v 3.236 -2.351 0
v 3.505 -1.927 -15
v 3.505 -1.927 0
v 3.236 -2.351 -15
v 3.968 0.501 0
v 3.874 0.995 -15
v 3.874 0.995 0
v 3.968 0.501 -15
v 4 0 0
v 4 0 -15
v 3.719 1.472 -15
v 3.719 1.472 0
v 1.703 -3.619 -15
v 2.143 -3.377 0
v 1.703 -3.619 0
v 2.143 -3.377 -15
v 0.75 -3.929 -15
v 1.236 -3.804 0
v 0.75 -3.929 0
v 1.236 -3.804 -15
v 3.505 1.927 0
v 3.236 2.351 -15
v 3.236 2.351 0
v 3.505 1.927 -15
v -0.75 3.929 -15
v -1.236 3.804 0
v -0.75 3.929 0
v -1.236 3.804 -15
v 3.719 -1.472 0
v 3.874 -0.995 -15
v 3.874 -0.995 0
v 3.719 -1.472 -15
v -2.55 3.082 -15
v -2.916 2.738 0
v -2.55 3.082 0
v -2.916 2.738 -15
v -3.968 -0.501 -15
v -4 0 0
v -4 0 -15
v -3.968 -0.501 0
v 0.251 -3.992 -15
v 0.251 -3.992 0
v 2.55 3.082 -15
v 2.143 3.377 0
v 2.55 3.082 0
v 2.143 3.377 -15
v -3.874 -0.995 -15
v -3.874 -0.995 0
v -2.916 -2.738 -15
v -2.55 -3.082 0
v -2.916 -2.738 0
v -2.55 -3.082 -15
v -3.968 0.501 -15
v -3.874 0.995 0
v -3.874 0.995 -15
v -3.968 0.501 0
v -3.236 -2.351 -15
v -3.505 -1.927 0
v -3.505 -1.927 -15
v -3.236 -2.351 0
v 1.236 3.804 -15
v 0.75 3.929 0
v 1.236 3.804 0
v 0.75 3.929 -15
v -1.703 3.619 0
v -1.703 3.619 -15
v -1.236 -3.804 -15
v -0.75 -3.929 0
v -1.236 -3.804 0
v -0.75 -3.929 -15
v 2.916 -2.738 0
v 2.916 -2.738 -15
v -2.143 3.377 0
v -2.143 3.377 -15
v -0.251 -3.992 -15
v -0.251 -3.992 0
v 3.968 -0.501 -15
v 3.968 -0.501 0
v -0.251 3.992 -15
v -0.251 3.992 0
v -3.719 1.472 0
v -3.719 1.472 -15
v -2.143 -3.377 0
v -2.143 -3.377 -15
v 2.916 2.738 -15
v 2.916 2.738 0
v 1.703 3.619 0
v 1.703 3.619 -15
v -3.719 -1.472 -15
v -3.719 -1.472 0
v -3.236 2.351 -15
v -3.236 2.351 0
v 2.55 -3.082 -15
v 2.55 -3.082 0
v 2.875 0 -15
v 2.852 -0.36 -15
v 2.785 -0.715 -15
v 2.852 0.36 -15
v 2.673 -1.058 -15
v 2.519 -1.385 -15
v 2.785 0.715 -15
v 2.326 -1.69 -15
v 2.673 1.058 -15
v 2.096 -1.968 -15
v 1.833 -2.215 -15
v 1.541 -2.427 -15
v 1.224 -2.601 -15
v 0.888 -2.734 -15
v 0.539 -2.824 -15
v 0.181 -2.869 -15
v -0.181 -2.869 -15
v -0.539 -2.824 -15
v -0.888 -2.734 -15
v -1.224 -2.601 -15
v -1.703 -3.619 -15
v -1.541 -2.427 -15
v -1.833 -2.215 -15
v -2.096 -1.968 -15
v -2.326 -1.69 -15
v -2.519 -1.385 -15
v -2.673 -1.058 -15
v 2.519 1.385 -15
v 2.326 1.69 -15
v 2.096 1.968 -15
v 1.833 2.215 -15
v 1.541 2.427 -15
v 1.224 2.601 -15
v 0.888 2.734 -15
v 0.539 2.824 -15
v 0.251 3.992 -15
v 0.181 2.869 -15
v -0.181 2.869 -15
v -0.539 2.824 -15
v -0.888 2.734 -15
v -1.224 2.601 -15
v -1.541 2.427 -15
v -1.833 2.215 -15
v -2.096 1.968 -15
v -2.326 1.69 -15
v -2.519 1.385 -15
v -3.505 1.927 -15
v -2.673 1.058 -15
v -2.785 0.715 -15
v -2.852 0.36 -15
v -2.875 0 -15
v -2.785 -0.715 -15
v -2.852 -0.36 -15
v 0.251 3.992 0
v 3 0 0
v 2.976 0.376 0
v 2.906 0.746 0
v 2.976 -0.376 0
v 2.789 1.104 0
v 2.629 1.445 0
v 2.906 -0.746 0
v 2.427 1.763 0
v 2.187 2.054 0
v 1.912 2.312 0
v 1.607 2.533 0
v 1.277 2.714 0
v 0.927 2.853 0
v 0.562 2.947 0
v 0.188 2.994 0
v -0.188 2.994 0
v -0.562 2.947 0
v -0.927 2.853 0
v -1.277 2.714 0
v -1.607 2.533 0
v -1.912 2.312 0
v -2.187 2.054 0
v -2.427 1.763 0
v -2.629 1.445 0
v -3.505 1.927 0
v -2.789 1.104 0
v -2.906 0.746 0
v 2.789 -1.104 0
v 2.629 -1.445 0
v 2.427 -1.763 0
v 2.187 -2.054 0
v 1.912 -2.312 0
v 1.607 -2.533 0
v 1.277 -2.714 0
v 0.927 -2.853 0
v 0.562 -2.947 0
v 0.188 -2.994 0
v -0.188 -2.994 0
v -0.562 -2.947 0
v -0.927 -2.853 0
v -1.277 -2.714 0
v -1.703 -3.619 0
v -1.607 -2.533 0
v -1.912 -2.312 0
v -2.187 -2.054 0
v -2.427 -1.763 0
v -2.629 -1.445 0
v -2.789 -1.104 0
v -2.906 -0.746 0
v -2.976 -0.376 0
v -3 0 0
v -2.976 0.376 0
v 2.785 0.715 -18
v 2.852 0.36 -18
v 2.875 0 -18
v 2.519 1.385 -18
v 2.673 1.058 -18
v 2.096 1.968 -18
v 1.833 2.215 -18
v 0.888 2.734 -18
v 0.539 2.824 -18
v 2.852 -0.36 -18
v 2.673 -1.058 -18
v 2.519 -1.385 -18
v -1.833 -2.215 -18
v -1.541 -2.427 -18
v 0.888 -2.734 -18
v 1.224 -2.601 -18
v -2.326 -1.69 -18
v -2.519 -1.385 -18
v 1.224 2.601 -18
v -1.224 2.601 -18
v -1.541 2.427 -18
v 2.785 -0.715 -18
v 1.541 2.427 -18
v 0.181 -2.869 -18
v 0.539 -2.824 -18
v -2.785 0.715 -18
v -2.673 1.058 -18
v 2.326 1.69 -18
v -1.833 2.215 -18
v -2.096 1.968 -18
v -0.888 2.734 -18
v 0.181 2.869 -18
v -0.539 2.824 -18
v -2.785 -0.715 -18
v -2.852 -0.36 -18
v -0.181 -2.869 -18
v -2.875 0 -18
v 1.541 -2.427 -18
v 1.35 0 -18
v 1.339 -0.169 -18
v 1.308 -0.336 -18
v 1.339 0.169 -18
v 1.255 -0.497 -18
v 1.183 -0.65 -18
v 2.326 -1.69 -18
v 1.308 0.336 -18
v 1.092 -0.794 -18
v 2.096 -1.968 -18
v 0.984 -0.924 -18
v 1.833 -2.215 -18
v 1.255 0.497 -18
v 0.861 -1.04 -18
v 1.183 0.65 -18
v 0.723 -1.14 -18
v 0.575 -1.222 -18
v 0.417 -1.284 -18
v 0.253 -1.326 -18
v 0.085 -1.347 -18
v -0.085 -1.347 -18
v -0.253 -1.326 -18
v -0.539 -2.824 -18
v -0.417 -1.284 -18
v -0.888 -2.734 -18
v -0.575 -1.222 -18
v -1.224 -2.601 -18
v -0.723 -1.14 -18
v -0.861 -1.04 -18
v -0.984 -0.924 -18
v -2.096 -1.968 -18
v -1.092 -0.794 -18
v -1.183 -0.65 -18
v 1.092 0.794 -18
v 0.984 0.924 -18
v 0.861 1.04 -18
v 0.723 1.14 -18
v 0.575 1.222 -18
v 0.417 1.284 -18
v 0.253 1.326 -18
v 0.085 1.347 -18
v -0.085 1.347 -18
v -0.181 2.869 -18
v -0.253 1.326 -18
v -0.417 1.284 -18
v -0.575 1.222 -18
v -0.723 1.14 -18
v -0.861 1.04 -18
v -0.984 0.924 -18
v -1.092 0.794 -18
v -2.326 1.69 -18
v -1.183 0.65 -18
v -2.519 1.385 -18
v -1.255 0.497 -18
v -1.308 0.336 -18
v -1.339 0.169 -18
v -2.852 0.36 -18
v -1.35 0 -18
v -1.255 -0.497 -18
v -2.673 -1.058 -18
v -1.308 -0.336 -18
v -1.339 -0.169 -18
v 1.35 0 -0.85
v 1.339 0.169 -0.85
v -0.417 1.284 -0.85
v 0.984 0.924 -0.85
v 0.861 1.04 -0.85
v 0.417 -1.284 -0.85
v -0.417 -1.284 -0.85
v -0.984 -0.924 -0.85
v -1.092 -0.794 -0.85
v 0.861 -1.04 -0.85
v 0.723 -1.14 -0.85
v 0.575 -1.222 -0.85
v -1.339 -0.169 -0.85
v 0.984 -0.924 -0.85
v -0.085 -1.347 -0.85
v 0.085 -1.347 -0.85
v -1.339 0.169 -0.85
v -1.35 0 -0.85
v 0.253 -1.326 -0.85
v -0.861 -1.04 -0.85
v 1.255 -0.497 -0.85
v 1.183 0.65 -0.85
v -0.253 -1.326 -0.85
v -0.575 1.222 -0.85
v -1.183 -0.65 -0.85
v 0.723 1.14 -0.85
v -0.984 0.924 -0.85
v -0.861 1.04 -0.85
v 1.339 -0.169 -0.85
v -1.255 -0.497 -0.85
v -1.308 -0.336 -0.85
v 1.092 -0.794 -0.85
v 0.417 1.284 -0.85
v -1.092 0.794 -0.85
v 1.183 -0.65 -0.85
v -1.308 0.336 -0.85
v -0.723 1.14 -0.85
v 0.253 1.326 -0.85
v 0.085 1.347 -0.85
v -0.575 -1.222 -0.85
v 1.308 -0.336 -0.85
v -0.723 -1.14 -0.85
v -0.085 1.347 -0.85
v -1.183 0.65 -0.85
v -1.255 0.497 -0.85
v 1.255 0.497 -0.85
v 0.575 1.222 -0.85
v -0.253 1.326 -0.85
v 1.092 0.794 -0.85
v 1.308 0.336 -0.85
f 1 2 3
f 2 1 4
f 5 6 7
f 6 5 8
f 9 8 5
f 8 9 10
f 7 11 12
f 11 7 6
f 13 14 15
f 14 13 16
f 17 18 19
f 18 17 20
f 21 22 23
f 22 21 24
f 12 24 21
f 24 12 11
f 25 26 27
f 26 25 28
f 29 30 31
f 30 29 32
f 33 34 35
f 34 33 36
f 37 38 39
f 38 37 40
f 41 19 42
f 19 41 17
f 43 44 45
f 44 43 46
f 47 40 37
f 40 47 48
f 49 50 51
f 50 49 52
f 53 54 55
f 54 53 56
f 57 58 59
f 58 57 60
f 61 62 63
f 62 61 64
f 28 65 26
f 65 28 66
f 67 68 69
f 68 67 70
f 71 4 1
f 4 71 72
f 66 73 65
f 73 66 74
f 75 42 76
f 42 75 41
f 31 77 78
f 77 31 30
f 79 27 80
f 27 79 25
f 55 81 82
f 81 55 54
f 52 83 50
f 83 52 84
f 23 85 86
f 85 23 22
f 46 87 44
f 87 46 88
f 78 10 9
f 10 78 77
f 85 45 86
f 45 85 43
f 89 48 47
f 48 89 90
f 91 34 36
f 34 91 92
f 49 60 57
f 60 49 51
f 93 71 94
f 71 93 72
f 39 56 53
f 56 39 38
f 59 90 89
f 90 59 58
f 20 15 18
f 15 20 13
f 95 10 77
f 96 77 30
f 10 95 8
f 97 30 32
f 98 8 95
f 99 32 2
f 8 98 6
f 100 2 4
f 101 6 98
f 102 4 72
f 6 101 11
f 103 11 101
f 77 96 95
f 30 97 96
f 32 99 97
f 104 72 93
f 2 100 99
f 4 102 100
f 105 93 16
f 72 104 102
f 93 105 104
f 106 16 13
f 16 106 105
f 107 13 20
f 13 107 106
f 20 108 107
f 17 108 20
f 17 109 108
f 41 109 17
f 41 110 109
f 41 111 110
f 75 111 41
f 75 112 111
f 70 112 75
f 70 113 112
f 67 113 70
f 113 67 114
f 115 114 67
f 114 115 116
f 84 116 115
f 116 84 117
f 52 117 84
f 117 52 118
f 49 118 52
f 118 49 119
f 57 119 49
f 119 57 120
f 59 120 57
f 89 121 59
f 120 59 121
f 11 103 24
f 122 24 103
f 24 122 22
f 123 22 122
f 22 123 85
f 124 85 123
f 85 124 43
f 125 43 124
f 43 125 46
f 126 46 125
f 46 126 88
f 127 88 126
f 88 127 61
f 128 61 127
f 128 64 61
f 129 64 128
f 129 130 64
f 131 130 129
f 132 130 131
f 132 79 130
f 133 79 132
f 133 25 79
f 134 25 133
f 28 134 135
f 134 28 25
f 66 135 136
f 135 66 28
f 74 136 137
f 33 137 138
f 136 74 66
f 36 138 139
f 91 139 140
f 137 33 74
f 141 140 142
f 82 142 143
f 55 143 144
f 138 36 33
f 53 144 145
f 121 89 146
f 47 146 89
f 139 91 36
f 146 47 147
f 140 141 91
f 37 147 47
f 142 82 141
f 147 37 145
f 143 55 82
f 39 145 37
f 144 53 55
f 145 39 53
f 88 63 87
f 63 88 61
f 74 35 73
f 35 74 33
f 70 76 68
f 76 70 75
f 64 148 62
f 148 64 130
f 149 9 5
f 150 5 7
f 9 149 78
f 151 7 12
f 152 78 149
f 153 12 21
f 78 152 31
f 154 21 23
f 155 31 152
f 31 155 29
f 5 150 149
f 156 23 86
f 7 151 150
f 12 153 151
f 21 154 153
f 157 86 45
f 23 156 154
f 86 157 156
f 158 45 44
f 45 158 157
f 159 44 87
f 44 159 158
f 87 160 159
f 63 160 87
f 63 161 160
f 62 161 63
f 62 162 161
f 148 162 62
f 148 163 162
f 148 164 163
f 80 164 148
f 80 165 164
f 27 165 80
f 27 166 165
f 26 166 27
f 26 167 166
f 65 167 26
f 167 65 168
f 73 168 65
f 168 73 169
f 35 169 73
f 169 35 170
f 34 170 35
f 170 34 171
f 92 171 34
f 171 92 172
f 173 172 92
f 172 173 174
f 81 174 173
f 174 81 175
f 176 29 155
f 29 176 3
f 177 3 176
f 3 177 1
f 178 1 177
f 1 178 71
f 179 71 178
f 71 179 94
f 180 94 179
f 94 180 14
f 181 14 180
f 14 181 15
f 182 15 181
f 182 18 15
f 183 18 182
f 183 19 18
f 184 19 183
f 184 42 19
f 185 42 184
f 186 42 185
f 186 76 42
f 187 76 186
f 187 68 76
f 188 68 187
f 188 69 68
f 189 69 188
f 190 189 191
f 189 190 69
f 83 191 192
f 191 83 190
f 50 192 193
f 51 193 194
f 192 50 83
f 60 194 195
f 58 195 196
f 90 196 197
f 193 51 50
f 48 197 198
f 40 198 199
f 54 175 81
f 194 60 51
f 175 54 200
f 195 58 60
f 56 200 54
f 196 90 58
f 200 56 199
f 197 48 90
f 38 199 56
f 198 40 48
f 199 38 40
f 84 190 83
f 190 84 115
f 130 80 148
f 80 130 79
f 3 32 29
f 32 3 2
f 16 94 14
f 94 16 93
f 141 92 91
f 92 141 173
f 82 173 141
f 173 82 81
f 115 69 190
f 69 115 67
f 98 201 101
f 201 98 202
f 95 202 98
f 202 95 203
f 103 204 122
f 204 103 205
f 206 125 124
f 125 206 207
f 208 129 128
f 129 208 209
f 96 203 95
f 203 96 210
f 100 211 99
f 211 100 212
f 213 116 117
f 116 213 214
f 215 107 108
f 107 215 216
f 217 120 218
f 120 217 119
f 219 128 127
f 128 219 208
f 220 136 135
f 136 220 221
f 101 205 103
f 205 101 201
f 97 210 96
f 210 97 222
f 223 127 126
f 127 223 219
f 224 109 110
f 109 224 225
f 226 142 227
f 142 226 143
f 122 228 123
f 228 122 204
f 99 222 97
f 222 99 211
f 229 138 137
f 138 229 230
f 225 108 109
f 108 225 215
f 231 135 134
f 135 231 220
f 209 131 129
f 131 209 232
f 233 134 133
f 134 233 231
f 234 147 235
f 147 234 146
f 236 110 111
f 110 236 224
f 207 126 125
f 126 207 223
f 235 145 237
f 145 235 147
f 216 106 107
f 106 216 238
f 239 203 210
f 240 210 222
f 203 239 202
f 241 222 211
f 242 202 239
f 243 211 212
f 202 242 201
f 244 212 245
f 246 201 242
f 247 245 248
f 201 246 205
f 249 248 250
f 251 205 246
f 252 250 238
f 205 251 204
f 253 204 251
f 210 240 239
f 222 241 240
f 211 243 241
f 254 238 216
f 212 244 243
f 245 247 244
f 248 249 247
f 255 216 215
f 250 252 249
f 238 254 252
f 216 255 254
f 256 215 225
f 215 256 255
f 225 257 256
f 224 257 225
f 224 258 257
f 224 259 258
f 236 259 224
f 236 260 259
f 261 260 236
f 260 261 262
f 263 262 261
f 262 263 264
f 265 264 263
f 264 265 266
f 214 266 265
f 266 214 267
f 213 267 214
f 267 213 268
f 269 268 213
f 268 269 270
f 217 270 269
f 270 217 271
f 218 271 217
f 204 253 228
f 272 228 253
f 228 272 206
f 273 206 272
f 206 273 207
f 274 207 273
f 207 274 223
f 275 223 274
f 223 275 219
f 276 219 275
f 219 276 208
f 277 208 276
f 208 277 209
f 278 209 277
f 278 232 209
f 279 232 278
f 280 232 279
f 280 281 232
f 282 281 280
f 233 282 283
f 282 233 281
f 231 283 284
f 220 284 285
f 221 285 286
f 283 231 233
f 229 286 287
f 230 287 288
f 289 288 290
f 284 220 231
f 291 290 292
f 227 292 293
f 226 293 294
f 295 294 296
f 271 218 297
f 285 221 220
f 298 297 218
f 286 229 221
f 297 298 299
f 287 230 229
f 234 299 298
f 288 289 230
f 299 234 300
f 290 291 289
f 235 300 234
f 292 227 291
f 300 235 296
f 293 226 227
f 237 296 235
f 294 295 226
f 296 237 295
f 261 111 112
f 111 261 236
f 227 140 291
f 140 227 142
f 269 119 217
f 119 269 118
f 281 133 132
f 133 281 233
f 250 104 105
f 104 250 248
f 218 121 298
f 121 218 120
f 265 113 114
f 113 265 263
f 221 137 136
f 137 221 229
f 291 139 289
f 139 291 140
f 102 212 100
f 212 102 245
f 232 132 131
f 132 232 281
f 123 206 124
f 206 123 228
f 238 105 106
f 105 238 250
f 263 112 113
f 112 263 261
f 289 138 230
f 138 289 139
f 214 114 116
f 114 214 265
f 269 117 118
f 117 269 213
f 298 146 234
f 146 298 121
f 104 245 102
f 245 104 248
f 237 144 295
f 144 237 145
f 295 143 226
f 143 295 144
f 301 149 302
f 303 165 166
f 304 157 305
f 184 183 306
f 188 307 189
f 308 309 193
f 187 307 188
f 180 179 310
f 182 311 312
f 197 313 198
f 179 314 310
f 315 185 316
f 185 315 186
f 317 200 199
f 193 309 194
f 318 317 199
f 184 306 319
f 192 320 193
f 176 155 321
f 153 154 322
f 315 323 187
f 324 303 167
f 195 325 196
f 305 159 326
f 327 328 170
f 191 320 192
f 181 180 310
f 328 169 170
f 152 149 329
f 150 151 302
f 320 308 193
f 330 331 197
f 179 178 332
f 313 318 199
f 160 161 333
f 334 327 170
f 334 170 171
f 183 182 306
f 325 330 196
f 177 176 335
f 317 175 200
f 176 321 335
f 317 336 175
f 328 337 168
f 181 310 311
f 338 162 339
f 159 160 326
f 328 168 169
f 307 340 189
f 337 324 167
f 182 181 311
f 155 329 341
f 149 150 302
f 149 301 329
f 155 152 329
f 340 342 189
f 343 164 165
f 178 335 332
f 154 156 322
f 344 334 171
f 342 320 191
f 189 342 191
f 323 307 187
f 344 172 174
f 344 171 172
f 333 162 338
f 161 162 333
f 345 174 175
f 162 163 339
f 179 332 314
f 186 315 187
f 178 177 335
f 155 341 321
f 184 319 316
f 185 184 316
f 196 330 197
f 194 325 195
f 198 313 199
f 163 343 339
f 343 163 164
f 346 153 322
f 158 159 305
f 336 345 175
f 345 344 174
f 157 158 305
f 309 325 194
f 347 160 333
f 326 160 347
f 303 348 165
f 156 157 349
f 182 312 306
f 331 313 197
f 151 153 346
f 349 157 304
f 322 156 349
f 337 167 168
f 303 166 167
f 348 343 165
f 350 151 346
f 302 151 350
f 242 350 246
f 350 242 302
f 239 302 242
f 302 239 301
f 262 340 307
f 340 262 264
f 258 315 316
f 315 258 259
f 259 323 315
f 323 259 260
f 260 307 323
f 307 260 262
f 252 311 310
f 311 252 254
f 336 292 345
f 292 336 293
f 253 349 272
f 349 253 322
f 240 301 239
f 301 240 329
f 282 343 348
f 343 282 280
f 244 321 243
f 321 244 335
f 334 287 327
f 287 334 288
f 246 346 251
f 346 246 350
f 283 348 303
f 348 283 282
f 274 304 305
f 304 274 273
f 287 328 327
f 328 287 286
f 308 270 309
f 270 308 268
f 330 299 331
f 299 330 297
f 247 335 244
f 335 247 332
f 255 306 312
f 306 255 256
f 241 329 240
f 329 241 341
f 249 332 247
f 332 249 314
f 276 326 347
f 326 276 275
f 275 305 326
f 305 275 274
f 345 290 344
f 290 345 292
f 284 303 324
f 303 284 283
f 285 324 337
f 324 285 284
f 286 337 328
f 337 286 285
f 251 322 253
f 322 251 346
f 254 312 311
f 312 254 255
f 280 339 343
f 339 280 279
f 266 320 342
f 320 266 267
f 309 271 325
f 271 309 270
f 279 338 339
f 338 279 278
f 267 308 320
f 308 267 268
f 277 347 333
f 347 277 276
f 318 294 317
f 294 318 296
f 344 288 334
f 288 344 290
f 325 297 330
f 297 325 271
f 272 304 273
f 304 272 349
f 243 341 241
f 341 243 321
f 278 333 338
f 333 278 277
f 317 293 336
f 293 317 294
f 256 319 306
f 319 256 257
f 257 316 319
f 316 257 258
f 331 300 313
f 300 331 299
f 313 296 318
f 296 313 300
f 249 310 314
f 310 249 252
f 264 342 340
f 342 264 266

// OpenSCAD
$fn = 50;

difference() {
	union() {
		translate(v = [0, 0, -15.0]) {
			cylinder(h = 15, r = 4.0);
		}
		#translate(v = [0, 0, -18.0]) {
			cylinder(h = 18, r = 2.875);
		}
	}
	union() {
		translate(v = [0, 0, 0]) {
			rotate(a = [0, 0, 0]) {
				difference() {
					union() {
						translate(v = [0, 0, -18.0]) {
							cylinder(h = 18, r = 1.0);
						}
						translate(v = [0, 0, -0.85]) {
							cylinder(h = 0.85, r1 = 1.35, r2 = 3.0);
						}
						translate(v = [0, 0, -18.0]) {
							cylinder(h = 18, r = 1.35);
						}
						translate(v = [0, 0, -18.0]) {
							cylinder(h = 18, r = 1.0);
						}
					}
					union();
				}
			}
		}
	}
}
